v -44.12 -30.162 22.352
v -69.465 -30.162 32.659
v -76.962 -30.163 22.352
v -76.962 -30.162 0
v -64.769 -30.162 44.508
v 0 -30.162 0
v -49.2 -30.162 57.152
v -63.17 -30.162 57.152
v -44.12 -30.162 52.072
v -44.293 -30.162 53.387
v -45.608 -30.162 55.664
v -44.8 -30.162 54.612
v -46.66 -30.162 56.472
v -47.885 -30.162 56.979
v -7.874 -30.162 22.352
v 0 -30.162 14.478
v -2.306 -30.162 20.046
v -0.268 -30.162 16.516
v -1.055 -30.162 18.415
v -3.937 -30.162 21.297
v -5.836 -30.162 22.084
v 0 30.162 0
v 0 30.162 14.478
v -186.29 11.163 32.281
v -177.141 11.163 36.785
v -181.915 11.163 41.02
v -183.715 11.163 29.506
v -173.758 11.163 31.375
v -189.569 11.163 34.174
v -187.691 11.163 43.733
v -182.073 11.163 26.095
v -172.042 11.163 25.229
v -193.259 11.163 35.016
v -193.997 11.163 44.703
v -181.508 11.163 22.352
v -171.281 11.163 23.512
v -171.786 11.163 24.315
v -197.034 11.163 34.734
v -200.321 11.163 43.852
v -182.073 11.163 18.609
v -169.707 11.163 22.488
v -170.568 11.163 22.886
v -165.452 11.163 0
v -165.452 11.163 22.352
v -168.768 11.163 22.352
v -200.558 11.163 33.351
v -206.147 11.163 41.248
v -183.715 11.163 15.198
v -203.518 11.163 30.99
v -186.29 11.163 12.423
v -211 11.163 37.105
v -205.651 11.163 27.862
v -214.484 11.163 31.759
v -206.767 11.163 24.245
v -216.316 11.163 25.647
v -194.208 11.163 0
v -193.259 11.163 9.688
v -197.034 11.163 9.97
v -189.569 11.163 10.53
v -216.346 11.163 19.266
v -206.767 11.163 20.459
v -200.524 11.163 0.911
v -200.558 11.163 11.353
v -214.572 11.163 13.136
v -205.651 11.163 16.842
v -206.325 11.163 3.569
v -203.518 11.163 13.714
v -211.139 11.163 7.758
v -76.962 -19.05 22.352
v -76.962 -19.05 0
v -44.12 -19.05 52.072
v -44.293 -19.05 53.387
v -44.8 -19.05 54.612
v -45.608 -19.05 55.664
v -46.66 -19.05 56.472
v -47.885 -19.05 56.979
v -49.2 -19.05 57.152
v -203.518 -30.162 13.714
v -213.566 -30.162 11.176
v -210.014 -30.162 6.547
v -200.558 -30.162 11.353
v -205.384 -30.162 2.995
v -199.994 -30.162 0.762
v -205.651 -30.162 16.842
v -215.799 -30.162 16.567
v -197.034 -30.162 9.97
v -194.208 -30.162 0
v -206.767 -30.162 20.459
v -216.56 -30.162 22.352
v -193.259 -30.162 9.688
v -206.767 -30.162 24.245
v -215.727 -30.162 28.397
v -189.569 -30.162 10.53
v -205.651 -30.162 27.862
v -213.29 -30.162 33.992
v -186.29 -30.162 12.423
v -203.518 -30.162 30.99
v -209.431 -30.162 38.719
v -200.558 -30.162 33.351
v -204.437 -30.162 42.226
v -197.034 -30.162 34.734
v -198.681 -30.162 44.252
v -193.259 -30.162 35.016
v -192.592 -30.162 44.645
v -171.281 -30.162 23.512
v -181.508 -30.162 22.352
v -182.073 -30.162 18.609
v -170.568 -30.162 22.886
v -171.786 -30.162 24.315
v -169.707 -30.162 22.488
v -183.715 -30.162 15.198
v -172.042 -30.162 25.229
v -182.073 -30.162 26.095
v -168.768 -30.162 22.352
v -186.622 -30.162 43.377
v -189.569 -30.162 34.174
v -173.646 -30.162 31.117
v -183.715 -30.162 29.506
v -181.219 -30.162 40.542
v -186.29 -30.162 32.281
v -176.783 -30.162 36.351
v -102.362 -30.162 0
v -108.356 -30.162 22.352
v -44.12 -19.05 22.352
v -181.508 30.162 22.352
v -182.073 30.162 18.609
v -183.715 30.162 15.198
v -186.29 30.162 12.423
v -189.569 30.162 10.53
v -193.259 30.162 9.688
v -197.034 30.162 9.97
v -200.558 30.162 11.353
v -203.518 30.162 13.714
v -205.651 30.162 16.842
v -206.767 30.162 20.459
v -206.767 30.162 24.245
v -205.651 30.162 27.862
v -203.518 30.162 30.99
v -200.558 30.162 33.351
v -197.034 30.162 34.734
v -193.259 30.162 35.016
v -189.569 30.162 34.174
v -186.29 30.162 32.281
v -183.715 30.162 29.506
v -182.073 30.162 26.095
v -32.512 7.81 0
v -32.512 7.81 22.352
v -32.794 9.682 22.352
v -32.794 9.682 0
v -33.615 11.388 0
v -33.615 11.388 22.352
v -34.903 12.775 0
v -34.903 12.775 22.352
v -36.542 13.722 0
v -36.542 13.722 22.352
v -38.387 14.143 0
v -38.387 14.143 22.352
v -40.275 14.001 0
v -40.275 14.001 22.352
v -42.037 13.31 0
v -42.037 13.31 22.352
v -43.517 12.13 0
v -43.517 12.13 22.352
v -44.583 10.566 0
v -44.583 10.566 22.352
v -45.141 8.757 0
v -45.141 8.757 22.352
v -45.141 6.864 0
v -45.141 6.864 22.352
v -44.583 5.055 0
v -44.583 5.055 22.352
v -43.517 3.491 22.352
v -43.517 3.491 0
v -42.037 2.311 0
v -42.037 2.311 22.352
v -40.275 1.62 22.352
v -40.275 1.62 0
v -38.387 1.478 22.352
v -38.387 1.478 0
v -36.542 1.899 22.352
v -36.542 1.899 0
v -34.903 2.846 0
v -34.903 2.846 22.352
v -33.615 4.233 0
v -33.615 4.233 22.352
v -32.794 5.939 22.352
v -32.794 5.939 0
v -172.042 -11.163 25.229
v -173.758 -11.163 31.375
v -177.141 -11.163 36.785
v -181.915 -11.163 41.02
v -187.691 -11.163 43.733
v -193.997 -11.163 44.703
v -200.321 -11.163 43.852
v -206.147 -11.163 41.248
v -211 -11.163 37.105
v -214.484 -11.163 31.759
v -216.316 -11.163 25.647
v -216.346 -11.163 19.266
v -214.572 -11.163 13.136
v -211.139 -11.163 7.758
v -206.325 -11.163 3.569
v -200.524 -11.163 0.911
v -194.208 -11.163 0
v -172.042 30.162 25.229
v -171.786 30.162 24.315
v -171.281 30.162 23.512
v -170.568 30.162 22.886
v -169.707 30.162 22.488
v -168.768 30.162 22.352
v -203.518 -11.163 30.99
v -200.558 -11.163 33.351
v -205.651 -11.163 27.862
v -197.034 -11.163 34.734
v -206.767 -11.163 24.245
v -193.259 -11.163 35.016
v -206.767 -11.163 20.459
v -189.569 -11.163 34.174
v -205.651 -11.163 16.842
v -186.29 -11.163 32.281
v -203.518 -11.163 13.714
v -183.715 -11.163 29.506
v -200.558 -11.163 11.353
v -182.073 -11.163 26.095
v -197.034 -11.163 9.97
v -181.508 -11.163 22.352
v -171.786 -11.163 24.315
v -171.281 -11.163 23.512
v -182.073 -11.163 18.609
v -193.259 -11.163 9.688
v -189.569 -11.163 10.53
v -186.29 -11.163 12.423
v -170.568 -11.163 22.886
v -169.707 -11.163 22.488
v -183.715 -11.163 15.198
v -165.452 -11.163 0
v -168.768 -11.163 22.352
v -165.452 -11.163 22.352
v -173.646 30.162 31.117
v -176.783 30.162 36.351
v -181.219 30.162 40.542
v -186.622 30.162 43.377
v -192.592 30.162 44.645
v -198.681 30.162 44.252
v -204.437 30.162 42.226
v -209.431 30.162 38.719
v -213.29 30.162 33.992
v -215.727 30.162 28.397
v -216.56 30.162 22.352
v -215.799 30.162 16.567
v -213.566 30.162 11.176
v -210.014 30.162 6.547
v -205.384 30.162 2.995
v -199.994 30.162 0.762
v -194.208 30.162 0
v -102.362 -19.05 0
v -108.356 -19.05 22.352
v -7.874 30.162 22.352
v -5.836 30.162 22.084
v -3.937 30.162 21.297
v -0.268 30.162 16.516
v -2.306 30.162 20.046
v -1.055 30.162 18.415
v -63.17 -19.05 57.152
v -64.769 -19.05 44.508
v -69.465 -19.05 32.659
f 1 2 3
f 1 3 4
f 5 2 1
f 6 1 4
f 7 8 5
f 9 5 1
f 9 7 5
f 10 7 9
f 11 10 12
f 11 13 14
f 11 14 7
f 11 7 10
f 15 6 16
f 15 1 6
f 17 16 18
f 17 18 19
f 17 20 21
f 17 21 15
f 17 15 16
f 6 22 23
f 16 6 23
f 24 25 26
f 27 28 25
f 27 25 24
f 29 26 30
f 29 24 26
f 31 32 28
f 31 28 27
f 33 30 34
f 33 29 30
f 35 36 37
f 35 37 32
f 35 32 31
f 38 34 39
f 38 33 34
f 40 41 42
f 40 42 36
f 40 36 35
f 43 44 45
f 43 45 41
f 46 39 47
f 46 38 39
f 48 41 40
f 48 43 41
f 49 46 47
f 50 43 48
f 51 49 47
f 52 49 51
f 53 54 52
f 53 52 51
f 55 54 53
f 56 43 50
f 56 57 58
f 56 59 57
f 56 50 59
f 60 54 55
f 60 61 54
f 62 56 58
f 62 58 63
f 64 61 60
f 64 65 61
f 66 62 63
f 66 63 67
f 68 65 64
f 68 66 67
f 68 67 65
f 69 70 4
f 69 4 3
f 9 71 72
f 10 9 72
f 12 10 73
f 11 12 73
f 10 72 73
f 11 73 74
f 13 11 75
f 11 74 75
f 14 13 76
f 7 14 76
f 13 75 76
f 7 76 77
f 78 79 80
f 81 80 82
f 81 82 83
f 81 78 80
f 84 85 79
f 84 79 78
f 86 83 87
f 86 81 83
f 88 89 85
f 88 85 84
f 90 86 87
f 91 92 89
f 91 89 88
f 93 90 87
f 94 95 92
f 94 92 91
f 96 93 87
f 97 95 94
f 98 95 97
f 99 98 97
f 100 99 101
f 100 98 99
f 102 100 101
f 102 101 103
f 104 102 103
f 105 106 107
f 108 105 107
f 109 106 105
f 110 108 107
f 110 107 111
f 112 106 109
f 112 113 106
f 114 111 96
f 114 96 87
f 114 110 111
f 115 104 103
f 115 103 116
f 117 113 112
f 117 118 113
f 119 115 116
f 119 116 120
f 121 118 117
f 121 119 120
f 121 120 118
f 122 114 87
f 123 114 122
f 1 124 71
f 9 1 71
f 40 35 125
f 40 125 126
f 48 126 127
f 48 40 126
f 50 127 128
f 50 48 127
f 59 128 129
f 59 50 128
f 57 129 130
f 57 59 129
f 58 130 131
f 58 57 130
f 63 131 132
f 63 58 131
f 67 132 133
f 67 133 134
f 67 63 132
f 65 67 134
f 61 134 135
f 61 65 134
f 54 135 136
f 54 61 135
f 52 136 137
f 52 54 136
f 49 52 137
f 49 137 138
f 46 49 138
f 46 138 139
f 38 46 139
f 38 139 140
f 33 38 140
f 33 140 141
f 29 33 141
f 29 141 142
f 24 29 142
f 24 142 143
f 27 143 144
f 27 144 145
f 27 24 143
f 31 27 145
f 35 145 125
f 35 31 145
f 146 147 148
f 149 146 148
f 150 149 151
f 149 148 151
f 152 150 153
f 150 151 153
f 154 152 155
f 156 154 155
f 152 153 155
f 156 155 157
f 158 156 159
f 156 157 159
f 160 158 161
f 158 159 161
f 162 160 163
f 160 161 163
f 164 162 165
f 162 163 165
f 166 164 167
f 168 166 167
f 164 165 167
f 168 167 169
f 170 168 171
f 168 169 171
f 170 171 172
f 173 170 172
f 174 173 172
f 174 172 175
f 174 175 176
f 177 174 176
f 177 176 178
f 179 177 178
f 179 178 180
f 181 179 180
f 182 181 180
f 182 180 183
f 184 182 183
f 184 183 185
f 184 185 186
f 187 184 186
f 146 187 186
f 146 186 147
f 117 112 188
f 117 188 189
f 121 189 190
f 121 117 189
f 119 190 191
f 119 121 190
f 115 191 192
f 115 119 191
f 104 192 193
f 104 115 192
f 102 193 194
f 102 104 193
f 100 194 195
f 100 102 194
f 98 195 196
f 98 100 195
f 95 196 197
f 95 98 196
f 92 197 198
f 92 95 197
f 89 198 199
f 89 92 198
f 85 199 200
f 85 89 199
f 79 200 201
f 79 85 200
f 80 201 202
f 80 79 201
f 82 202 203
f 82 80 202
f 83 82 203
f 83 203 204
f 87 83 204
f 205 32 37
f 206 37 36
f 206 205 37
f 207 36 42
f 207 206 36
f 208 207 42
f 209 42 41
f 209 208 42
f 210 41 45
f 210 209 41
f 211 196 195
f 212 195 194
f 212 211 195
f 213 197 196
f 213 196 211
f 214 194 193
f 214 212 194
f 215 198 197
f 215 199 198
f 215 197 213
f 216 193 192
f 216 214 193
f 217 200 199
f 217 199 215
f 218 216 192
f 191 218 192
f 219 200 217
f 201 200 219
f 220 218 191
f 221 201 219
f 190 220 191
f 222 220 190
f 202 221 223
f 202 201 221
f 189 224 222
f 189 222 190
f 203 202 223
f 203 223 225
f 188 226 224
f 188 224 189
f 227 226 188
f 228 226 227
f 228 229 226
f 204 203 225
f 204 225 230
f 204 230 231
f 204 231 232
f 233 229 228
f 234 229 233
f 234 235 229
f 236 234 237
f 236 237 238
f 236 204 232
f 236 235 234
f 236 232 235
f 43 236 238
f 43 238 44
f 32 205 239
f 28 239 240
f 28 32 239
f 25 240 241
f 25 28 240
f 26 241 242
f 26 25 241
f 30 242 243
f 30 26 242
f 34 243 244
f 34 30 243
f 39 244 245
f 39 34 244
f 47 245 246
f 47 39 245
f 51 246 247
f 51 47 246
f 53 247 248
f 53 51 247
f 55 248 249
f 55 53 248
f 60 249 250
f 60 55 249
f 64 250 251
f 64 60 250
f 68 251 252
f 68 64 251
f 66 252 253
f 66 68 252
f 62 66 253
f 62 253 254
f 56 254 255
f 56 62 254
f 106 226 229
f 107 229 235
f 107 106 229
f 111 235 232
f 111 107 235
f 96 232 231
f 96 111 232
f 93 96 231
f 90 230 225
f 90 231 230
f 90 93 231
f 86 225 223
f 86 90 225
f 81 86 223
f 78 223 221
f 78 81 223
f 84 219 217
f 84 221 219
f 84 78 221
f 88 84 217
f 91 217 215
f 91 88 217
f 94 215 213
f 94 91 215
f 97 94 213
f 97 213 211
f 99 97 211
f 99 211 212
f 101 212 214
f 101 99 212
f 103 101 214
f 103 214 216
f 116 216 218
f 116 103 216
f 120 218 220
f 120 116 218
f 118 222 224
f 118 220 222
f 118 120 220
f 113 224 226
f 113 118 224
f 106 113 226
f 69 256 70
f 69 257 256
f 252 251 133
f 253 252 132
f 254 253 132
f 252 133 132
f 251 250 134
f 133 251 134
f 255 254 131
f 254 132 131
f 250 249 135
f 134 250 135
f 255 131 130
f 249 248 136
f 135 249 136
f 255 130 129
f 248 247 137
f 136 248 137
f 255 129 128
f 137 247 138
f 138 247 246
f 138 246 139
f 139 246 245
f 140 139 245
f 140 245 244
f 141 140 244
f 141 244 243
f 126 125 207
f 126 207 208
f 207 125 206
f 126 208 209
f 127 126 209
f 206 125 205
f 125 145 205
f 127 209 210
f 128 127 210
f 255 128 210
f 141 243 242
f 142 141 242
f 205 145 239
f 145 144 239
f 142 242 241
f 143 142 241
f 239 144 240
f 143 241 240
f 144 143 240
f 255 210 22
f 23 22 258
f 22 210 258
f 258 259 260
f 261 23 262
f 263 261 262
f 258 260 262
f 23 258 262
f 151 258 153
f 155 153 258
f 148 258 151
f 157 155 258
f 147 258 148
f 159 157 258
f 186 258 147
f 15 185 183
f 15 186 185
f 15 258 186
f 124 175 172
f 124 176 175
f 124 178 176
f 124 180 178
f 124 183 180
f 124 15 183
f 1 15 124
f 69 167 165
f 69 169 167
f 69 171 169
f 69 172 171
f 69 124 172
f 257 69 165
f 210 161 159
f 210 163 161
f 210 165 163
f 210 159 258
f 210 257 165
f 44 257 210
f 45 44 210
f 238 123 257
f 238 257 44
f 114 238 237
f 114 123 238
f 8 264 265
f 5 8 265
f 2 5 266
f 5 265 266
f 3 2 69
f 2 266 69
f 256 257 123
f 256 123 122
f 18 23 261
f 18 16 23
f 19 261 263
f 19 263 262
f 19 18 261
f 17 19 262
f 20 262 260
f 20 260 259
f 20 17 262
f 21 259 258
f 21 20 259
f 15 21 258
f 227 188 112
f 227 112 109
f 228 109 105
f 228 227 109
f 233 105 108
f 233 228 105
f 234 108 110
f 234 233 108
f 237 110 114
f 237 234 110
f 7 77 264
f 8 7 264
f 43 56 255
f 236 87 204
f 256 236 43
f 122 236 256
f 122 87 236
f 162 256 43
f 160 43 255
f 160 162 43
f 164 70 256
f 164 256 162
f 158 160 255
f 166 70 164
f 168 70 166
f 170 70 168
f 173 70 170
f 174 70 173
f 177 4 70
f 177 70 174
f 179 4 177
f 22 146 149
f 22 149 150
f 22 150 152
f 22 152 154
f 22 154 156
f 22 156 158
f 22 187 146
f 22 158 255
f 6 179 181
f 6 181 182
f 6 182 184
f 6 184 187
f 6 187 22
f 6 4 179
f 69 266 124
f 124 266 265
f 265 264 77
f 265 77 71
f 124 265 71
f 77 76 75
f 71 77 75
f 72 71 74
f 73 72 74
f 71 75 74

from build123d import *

# Parameters (mm, degrees)
F1_DEPTH = 30.1625
F2_START = 19.05
F2_DEPTH = 11.1125
F3_START = 19.05
F3_DEPTH = 11.1125
F4_R     = 3.302
F6_DEPTH = 57.1533267105
F7_R     = 6.35
F8_DEPTH = 22.353


with BuildPart() as f1:
    # F0 (on Front) → F1 (new body, symmetric)
    with BuildSketch(Plane.XZ):
        with BuildLine():
            ThreePointArc((-171.8564, 22.352), (-194.2084, 44.704), (-216.5604, 22.352))
            Line((-216.5604, 22.352), (-206.9084, 22.352))
            ThreePointArc((-206.9084, 22.352), (-194.2084, 35.052), (-181.5084, 22.352))
            Line((-181.5084, 22.352), (-171.8564, 22.352))
        make_face()
        with BuildLine():
            ThreePointArc((-216.5604, 22.352), (-210.0136507731, 6.5467492269), (-194.2084, 0))
            ThreePointArc((-194.2084, 0), (-178.4031492269, 6.5467492269), (-171.8564, 22.352))
            Line((-171.8564, 22.352), (-181.5084, 22.352))
            ThreePointArc((-181.5084, 22.352), (-194.2084, 9.652), (-206.9084, 22.352))
            Line((-206.9084, 22.352), (-216.5604, 22.352))
        make_face()
        Polygon((-165.9270077944, 0), (-102.362, 0), (-108.3564, 22.352), (-165.9270077944, 22.352), align=None)
        with BuildLine():
            Line((-76.962, 0), (0, 0))
            Line((0, 0), (0, 14.478))
            ThreePointArc((0, 14.478), (-2.3062412049, 20.0457587951), (-7.874, 22.352))
            Line((-7.874, 22.352), (-44.1198, 22.352))
            Line((-44.1198, 22.352), (-76.962, 22.352))
            Line((-76.962, 22.352), (-76.962, 0))
        make_face()
        Polygon((-102.362, 0), (-76.962, 0), (-76.962, 22.352), (-108.3564, 22.352), align=None)
        with BuildLine():
            Line((-194.2084, 0), (-165.9270077944, 0))
            Line((-165.9270077944, 0), (-165.9270077944, 22.352))
            Line((-165.9270077944, 22.352), (-171.8564, 22.352))
            ThreePointArc((-171.8564, 22.352), (-178.4031492269, 6.5467492269), (-194.2084, 0))
        make_face()
    extrude(amount=F1_DEPTH, both=True)

    # F0 (on Front) → F2 (join)
    with BuildSketch(Plane.XZ.offset(F2_START)):
        with BuildLine():
            ThreePointArc((-63.1698, 57.1523267105), (-66.7435560249, 38.4354391488), (-76.962, 22.352))
            Line((-76.962, 22.352), (-44.1198, 22.352))
            Line((-44.1198, 22.352), (-44.1198, 52.0723267105))
            ThreePointArc((-44.1198, 52.0723267105), (-45.6076975516, 55.664429159), (-49.1998, 57.1523267105))
            Line((-49.1998, 57.1523267105), (-63.1698, 57.1523267105))
        make_face()
    extrude(amount=F2_DEPTH)

    # F0 (on Front) → F3 (cut)
    with BuildSketch(Plane.XZ.offset(F3_START)):
        Polygon((-102.362, 0), (-76.962, 0), (-76.962, 22.352), (-108.3564, 22.352), align=None)
    extrude(amount=F3_DEPTH, mode=Mode.SUBTRACT)

    # F4
    f4_edges = [f1.edges().sort_by_distance(p)[0] for p in [
        (-171.8564, 0, 22.352),
    ]]
    fillet(f4_edges, radius=F4_R)

    # F5 (on Top) → F6 (cut, through all)
    with BuildSketch(Plane.XY):
        Polygon((-165.4523751593, -11.1633), (-165.4523751593, 0), (-165.4523751593, 11.1633), (-218.2923191004, 11.1633), (-218.2923191004, -11.1633), align=None)
    extrude(amount=F6_DEPTH, mode=Mode.SUBTRACT)

    # F7 (on face) → F8 (cut, through all)
    with BuildSketch(Plane.XY.offset(22.352)):
        with Locations((-38.862, 7.8105)):
            Circle(F7_R)
    extrude(amount=-F8_DEPTH, mode=Mode.SUBTRACT)


solid = f1.part
